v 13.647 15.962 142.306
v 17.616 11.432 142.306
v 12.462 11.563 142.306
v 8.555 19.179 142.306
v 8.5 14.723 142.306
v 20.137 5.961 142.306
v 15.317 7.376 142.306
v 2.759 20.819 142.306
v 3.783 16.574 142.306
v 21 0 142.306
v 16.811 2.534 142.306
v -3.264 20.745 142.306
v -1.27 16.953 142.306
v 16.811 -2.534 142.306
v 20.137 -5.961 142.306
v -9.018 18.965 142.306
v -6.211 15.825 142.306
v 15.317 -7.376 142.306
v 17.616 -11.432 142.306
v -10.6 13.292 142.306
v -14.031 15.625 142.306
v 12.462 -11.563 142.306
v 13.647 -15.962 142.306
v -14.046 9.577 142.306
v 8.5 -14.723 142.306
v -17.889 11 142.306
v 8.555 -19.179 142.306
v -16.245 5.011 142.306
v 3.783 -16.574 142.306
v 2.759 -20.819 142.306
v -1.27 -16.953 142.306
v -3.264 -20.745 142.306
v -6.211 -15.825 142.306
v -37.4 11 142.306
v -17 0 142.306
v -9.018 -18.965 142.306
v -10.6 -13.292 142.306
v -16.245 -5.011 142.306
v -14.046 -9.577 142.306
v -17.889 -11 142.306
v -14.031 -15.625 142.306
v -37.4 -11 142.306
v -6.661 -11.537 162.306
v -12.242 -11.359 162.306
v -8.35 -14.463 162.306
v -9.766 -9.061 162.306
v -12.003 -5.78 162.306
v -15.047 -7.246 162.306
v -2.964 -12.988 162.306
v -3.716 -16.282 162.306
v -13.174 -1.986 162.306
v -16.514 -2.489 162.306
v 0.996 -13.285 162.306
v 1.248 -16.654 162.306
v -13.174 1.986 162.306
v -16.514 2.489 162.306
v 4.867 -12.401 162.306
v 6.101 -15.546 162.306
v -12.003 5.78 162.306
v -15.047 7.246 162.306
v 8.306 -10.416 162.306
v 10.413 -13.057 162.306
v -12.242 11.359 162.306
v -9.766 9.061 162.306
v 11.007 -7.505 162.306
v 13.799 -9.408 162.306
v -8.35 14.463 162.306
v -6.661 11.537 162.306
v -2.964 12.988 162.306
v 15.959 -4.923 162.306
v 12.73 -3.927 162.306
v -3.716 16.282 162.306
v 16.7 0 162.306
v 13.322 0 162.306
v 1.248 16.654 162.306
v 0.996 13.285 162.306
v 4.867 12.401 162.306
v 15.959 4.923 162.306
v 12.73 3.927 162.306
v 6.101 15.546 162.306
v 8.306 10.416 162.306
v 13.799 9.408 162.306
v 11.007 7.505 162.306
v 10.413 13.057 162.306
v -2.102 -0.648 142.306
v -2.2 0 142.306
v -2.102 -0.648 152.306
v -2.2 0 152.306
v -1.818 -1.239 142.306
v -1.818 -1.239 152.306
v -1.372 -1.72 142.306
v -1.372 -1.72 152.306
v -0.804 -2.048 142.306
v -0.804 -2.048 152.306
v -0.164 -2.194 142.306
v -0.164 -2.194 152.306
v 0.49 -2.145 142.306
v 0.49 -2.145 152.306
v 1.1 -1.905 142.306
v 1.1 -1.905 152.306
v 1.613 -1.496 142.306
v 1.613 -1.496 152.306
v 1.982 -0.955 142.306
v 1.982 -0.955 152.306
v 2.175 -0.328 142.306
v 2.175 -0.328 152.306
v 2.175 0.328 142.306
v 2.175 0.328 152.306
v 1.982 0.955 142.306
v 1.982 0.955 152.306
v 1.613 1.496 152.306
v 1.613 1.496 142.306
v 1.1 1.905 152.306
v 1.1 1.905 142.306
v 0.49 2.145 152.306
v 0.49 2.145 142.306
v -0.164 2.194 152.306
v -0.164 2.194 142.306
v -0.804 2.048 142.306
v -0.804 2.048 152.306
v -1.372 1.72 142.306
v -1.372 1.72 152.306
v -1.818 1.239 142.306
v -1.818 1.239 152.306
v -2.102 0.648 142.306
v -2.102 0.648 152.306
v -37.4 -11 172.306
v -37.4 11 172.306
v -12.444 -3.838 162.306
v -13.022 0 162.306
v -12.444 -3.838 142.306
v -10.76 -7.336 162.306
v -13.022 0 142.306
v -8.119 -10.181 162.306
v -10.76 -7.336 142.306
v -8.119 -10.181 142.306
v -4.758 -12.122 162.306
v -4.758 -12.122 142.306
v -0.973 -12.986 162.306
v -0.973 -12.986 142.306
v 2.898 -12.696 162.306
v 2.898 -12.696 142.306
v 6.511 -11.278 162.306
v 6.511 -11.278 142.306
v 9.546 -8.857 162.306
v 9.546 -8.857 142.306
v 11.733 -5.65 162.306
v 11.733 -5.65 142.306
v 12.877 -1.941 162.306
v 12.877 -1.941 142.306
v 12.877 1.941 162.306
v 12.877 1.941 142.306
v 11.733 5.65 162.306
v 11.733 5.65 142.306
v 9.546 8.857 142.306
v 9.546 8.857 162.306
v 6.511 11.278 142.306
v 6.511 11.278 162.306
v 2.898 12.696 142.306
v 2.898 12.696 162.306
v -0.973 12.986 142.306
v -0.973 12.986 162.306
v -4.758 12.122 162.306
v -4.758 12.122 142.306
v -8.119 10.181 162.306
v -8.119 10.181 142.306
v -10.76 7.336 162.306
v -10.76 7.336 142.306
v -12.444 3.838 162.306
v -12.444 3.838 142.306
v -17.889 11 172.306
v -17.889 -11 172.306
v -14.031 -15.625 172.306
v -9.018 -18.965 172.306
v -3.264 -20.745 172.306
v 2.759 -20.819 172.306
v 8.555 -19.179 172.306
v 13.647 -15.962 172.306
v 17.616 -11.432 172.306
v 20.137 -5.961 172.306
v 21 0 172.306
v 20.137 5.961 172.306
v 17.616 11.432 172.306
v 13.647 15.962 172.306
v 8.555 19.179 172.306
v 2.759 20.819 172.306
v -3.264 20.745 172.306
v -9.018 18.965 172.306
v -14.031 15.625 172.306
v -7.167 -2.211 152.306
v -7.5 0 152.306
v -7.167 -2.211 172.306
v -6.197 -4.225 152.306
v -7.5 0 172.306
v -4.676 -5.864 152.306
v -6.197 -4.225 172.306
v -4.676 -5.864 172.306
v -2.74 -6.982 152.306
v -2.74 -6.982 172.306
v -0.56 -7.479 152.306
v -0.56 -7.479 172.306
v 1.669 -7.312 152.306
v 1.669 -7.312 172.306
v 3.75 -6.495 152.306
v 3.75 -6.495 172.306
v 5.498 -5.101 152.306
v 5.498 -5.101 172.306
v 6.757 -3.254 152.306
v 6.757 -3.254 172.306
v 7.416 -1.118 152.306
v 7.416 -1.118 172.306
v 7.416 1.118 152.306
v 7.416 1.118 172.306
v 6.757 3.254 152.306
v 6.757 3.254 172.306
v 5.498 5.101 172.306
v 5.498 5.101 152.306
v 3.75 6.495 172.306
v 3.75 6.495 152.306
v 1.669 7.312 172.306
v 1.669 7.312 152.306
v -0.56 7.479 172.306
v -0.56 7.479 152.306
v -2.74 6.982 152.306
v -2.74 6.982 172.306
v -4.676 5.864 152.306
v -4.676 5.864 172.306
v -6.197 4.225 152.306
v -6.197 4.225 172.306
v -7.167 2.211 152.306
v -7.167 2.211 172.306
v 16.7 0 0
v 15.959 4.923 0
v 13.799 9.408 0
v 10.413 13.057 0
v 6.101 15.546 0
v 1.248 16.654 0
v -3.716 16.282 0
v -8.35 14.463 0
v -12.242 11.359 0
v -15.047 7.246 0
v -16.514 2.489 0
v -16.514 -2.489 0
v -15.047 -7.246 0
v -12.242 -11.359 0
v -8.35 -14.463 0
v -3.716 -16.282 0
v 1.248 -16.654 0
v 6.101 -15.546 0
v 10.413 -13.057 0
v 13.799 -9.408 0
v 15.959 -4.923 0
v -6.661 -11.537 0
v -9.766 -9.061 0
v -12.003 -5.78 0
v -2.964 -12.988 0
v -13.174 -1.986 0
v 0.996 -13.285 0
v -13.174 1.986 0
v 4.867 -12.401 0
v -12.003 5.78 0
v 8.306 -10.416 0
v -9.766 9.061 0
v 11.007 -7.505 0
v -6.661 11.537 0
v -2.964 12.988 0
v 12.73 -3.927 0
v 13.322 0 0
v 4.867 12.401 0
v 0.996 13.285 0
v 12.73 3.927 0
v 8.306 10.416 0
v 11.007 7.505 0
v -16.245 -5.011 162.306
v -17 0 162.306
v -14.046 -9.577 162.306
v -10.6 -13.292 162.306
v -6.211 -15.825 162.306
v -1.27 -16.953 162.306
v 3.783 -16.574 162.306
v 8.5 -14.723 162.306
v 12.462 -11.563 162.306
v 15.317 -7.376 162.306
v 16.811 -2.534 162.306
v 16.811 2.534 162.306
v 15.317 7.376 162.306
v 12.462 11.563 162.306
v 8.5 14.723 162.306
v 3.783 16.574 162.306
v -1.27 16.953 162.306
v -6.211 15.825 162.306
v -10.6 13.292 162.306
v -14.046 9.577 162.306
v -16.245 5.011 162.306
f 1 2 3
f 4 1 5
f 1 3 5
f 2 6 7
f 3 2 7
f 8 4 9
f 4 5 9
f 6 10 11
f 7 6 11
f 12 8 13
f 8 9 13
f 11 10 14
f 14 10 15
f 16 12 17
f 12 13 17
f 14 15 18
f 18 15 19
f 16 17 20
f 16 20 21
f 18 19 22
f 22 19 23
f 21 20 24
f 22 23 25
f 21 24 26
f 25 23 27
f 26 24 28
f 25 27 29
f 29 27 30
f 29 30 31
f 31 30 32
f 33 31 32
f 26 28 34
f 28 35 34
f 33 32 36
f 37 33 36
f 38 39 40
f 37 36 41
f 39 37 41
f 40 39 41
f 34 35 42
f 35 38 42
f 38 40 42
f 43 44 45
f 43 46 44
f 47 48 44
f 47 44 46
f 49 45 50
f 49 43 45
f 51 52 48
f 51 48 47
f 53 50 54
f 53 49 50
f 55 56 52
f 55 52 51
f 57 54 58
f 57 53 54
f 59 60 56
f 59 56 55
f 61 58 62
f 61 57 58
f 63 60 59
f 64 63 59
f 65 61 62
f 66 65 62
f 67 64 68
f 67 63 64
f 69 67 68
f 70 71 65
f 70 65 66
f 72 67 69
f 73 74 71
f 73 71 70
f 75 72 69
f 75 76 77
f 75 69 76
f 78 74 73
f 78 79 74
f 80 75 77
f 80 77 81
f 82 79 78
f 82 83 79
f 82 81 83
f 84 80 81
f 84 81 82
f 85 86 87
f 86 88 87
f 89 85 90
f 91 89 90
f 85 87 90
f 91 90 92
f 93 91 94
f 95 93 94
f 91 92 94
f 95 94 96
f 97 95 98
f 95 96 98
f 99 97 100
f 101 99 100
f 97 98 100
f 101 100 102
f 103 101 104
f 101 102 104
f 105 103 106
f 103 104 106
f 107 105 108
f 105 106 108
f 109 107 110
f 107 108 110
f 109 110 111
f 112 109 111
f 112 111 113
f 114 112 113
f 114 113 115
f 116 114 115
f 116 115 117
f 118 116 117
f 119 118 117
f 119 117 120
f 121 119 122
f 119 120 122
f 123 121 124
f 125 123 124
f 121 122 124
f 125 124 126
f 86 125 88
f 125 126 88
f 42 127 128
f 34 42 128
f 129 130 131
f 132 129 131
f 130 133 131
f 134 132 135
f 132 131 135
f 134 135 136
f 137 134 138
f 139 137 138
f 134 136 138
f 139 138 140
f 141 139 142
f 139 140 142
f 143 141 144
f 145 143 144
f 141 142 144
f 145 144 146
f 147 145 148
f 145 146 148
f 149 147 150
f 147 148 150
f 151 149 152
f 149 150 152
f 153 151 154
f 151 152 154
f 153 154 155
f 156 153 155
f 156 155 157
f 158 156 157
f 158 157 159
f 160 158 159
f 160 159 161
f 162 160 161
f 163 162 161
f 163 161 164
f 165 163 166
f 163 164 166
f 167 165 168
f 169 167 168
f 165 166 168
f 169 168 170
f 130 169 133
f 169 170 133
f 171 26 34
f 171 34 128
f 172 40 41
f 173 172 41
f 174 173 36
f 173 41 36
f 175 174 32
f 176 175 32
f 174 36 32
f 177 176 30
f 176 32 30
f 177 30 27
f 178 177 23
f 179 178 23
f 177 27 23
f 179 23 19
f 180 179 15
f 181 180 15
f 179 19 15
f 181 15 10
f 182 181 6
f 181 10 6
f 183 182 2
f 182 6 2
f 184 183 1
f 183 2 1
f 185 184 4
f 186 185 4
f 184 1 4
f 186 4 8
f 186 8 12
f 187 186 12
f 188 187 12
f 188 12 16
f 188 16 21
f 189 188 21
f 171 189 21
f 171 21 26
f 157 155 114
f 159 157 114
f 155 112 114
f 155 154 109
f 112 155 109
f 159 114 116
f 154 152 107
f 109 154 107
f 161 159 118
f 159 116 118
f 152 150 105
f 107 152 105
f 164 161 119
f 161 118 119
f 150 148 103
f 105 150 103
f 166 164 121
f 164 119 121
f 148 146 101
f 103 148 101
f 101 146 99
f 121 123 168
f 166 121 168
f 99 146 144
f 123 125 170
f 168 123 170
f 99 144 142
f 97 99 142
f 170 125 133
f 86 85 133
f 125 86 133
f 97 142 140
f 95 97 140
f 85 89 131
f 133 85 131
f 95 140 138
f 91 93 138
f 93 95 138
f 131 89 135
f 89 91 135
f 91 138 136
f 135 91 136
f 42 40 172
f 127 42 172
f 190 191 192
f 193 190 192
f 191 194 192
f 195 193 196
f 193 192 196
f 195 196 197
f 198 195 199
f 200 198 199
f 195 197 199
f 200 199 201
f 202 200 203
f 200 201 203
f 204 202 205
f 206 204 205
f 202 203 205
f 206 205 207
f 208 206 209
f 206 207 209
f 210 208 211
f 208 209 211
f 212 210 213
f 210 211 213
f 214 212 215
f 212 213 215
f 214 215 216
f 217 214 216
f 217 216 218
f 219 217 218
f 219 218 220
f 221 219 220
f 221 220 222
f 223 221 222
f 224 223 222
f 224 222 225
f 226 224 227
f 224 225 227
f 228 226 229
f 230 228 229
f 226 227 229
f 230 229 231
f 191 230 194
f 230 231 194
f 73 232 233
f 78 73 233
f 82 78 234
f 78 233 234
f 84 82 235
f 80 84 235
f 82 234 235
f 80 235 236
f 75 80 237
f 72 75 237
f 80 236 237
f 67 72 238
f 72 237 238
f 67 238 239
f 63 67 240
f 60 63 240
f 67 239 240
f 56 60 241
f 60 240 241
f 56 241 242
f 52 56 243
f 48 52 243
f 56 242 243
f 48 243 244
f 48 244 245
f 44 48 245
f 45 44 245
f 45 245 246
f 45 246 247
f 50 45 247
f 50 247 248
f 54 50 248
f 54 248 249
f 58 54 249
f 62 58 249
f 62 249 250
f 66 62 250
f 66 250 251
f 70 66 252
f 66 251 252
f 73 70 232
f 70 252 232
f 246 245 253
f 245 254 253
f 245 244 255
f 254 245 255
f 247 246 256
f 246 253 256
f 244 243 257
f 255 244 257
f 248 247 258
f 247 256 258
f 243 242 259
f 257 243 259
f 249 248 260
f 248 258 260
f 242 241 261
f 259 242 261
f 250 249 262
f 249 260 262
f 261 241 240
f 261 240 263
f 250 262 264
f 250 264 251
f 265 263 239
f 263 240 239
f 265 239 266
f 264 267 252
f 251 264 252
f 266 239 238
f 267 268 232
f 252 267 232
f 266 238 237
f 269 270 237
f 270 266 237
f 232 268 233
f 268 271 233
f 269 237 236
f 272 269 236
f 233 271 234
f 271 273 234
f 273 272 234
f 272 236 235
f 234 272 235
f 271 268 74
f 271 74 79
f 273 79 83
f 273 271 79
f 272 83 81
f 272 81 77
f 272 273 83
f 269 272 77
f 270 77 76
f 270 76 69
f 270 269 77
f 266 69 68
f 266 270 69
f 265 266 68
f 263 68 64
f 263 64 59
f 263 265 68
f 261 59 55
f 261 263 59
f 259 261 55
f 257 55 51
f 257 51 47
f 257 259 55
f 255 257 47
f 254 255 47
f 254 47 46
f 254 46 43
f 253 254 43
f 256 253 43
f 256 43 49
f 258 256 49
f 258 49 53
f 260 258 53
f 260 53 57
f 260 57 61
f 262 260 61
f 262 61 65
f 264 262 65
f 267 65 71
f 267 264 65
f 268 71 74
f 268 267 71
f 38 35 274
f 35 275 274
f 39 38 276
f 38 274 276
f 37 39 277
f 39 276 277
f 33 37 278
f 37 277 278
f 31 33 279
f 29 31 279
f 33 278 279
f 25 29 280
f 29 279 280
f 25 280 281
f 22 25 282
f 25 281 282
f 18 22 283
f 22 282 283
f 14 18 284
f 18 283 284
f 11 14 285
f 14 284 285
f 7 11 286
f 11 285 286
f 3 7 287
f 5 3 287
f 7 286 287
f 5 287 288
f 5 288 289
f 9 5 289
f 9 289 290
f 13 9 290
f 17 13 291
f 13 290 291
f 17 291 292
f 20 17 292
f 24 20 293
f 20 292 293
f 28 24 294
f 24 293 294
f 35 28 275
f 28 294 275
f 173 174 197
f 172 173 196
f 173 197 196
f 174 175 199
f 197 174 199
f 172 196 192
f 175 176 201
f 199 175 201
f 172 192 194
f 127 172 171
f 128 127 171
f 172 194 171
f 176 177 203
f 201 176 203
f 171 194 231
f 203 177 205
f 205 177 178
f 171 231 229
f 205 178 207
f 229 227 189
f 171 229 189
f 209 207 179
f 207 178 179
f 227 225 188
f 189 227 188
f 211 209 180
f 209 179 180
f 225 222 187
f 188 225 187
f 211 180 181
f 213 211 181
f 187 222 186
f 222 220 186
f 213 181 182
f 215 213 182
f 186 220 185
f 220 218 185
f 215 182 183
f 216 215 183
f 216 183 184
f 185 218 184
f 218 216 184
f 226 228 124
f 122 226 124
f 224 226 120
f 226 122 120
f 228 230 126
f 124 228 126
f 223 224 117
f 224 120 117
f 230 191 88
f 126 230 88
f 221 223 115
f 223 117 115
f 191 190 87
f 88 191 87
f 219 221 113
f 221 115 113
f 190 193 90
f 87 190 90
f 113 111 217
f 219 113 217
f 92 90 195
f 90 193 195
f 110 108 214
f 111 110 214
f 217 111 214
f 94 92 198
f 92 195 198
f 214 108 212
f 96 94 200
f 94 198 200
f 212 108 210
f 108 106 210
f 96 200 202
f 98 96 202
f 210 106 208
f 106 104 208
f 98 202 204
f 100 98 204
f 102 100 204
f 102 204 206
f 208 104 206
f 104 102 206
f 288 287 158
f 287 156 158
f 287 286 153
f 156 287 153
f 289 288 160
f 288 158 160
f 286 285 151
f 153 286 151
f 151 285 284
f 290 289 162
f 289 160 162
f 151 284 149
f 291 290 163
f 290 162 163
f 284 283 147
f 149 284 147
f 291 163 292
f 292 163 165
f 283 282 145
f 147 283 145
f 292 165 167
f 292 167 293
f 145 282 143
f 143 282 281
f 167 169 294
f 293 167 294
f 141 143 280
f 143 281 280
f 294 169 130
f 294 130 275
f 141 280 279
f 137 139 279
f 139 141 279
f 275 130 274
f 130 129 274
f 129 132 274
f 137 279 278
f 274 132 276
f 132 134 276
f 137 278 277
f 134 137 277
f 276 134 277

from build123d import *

# Parameters (mm, degrees)
F0_R     = 16.7005
F0_R_2   = 13.3223
F1_DEPTH = 162.306
F5_W     = 22
F5_H     = 30
F6_DEPTH = 20


with BuildPart() as f1:
    # F0 (on Top) → F1 (new body)
    with BuildSketch(Plane.XY):
        Circle(F0_R)
        Circle(F0_R_2, mode=Mode.SUBTRACT)
    extrude(amount=F1_DEPTH)


with BuildPart() as f3:
    # F2 (on Front) → F3 (revolve)
    with BuildSketch(Plane.XZ):
        Polygon((-21.0005, 142.306), (-17.0005, 142.306), (-17.0005, 162.306), (-13.0223, 162.306), (-13.0223, 142.306), (-2.2, 142.306), (-2.2, 152.306), (-7.5, 152.306), (-7.5, 172.306), (-21.0005, 172.306), align=None)
    revolve(axis=Axis((0, 0, 103.938333), (0, 0, 1)))

    # F5 (on offset) → F6 (join)
    with BuildSketch(Plane.YZ.offset(-17.4)):
        with Locations((0, 157.306)):
            Rectangle(F5_W, F5_H)
    extrude(amount=-F6_DEPTH)


solid = Compound([f1.part, f3.part])
